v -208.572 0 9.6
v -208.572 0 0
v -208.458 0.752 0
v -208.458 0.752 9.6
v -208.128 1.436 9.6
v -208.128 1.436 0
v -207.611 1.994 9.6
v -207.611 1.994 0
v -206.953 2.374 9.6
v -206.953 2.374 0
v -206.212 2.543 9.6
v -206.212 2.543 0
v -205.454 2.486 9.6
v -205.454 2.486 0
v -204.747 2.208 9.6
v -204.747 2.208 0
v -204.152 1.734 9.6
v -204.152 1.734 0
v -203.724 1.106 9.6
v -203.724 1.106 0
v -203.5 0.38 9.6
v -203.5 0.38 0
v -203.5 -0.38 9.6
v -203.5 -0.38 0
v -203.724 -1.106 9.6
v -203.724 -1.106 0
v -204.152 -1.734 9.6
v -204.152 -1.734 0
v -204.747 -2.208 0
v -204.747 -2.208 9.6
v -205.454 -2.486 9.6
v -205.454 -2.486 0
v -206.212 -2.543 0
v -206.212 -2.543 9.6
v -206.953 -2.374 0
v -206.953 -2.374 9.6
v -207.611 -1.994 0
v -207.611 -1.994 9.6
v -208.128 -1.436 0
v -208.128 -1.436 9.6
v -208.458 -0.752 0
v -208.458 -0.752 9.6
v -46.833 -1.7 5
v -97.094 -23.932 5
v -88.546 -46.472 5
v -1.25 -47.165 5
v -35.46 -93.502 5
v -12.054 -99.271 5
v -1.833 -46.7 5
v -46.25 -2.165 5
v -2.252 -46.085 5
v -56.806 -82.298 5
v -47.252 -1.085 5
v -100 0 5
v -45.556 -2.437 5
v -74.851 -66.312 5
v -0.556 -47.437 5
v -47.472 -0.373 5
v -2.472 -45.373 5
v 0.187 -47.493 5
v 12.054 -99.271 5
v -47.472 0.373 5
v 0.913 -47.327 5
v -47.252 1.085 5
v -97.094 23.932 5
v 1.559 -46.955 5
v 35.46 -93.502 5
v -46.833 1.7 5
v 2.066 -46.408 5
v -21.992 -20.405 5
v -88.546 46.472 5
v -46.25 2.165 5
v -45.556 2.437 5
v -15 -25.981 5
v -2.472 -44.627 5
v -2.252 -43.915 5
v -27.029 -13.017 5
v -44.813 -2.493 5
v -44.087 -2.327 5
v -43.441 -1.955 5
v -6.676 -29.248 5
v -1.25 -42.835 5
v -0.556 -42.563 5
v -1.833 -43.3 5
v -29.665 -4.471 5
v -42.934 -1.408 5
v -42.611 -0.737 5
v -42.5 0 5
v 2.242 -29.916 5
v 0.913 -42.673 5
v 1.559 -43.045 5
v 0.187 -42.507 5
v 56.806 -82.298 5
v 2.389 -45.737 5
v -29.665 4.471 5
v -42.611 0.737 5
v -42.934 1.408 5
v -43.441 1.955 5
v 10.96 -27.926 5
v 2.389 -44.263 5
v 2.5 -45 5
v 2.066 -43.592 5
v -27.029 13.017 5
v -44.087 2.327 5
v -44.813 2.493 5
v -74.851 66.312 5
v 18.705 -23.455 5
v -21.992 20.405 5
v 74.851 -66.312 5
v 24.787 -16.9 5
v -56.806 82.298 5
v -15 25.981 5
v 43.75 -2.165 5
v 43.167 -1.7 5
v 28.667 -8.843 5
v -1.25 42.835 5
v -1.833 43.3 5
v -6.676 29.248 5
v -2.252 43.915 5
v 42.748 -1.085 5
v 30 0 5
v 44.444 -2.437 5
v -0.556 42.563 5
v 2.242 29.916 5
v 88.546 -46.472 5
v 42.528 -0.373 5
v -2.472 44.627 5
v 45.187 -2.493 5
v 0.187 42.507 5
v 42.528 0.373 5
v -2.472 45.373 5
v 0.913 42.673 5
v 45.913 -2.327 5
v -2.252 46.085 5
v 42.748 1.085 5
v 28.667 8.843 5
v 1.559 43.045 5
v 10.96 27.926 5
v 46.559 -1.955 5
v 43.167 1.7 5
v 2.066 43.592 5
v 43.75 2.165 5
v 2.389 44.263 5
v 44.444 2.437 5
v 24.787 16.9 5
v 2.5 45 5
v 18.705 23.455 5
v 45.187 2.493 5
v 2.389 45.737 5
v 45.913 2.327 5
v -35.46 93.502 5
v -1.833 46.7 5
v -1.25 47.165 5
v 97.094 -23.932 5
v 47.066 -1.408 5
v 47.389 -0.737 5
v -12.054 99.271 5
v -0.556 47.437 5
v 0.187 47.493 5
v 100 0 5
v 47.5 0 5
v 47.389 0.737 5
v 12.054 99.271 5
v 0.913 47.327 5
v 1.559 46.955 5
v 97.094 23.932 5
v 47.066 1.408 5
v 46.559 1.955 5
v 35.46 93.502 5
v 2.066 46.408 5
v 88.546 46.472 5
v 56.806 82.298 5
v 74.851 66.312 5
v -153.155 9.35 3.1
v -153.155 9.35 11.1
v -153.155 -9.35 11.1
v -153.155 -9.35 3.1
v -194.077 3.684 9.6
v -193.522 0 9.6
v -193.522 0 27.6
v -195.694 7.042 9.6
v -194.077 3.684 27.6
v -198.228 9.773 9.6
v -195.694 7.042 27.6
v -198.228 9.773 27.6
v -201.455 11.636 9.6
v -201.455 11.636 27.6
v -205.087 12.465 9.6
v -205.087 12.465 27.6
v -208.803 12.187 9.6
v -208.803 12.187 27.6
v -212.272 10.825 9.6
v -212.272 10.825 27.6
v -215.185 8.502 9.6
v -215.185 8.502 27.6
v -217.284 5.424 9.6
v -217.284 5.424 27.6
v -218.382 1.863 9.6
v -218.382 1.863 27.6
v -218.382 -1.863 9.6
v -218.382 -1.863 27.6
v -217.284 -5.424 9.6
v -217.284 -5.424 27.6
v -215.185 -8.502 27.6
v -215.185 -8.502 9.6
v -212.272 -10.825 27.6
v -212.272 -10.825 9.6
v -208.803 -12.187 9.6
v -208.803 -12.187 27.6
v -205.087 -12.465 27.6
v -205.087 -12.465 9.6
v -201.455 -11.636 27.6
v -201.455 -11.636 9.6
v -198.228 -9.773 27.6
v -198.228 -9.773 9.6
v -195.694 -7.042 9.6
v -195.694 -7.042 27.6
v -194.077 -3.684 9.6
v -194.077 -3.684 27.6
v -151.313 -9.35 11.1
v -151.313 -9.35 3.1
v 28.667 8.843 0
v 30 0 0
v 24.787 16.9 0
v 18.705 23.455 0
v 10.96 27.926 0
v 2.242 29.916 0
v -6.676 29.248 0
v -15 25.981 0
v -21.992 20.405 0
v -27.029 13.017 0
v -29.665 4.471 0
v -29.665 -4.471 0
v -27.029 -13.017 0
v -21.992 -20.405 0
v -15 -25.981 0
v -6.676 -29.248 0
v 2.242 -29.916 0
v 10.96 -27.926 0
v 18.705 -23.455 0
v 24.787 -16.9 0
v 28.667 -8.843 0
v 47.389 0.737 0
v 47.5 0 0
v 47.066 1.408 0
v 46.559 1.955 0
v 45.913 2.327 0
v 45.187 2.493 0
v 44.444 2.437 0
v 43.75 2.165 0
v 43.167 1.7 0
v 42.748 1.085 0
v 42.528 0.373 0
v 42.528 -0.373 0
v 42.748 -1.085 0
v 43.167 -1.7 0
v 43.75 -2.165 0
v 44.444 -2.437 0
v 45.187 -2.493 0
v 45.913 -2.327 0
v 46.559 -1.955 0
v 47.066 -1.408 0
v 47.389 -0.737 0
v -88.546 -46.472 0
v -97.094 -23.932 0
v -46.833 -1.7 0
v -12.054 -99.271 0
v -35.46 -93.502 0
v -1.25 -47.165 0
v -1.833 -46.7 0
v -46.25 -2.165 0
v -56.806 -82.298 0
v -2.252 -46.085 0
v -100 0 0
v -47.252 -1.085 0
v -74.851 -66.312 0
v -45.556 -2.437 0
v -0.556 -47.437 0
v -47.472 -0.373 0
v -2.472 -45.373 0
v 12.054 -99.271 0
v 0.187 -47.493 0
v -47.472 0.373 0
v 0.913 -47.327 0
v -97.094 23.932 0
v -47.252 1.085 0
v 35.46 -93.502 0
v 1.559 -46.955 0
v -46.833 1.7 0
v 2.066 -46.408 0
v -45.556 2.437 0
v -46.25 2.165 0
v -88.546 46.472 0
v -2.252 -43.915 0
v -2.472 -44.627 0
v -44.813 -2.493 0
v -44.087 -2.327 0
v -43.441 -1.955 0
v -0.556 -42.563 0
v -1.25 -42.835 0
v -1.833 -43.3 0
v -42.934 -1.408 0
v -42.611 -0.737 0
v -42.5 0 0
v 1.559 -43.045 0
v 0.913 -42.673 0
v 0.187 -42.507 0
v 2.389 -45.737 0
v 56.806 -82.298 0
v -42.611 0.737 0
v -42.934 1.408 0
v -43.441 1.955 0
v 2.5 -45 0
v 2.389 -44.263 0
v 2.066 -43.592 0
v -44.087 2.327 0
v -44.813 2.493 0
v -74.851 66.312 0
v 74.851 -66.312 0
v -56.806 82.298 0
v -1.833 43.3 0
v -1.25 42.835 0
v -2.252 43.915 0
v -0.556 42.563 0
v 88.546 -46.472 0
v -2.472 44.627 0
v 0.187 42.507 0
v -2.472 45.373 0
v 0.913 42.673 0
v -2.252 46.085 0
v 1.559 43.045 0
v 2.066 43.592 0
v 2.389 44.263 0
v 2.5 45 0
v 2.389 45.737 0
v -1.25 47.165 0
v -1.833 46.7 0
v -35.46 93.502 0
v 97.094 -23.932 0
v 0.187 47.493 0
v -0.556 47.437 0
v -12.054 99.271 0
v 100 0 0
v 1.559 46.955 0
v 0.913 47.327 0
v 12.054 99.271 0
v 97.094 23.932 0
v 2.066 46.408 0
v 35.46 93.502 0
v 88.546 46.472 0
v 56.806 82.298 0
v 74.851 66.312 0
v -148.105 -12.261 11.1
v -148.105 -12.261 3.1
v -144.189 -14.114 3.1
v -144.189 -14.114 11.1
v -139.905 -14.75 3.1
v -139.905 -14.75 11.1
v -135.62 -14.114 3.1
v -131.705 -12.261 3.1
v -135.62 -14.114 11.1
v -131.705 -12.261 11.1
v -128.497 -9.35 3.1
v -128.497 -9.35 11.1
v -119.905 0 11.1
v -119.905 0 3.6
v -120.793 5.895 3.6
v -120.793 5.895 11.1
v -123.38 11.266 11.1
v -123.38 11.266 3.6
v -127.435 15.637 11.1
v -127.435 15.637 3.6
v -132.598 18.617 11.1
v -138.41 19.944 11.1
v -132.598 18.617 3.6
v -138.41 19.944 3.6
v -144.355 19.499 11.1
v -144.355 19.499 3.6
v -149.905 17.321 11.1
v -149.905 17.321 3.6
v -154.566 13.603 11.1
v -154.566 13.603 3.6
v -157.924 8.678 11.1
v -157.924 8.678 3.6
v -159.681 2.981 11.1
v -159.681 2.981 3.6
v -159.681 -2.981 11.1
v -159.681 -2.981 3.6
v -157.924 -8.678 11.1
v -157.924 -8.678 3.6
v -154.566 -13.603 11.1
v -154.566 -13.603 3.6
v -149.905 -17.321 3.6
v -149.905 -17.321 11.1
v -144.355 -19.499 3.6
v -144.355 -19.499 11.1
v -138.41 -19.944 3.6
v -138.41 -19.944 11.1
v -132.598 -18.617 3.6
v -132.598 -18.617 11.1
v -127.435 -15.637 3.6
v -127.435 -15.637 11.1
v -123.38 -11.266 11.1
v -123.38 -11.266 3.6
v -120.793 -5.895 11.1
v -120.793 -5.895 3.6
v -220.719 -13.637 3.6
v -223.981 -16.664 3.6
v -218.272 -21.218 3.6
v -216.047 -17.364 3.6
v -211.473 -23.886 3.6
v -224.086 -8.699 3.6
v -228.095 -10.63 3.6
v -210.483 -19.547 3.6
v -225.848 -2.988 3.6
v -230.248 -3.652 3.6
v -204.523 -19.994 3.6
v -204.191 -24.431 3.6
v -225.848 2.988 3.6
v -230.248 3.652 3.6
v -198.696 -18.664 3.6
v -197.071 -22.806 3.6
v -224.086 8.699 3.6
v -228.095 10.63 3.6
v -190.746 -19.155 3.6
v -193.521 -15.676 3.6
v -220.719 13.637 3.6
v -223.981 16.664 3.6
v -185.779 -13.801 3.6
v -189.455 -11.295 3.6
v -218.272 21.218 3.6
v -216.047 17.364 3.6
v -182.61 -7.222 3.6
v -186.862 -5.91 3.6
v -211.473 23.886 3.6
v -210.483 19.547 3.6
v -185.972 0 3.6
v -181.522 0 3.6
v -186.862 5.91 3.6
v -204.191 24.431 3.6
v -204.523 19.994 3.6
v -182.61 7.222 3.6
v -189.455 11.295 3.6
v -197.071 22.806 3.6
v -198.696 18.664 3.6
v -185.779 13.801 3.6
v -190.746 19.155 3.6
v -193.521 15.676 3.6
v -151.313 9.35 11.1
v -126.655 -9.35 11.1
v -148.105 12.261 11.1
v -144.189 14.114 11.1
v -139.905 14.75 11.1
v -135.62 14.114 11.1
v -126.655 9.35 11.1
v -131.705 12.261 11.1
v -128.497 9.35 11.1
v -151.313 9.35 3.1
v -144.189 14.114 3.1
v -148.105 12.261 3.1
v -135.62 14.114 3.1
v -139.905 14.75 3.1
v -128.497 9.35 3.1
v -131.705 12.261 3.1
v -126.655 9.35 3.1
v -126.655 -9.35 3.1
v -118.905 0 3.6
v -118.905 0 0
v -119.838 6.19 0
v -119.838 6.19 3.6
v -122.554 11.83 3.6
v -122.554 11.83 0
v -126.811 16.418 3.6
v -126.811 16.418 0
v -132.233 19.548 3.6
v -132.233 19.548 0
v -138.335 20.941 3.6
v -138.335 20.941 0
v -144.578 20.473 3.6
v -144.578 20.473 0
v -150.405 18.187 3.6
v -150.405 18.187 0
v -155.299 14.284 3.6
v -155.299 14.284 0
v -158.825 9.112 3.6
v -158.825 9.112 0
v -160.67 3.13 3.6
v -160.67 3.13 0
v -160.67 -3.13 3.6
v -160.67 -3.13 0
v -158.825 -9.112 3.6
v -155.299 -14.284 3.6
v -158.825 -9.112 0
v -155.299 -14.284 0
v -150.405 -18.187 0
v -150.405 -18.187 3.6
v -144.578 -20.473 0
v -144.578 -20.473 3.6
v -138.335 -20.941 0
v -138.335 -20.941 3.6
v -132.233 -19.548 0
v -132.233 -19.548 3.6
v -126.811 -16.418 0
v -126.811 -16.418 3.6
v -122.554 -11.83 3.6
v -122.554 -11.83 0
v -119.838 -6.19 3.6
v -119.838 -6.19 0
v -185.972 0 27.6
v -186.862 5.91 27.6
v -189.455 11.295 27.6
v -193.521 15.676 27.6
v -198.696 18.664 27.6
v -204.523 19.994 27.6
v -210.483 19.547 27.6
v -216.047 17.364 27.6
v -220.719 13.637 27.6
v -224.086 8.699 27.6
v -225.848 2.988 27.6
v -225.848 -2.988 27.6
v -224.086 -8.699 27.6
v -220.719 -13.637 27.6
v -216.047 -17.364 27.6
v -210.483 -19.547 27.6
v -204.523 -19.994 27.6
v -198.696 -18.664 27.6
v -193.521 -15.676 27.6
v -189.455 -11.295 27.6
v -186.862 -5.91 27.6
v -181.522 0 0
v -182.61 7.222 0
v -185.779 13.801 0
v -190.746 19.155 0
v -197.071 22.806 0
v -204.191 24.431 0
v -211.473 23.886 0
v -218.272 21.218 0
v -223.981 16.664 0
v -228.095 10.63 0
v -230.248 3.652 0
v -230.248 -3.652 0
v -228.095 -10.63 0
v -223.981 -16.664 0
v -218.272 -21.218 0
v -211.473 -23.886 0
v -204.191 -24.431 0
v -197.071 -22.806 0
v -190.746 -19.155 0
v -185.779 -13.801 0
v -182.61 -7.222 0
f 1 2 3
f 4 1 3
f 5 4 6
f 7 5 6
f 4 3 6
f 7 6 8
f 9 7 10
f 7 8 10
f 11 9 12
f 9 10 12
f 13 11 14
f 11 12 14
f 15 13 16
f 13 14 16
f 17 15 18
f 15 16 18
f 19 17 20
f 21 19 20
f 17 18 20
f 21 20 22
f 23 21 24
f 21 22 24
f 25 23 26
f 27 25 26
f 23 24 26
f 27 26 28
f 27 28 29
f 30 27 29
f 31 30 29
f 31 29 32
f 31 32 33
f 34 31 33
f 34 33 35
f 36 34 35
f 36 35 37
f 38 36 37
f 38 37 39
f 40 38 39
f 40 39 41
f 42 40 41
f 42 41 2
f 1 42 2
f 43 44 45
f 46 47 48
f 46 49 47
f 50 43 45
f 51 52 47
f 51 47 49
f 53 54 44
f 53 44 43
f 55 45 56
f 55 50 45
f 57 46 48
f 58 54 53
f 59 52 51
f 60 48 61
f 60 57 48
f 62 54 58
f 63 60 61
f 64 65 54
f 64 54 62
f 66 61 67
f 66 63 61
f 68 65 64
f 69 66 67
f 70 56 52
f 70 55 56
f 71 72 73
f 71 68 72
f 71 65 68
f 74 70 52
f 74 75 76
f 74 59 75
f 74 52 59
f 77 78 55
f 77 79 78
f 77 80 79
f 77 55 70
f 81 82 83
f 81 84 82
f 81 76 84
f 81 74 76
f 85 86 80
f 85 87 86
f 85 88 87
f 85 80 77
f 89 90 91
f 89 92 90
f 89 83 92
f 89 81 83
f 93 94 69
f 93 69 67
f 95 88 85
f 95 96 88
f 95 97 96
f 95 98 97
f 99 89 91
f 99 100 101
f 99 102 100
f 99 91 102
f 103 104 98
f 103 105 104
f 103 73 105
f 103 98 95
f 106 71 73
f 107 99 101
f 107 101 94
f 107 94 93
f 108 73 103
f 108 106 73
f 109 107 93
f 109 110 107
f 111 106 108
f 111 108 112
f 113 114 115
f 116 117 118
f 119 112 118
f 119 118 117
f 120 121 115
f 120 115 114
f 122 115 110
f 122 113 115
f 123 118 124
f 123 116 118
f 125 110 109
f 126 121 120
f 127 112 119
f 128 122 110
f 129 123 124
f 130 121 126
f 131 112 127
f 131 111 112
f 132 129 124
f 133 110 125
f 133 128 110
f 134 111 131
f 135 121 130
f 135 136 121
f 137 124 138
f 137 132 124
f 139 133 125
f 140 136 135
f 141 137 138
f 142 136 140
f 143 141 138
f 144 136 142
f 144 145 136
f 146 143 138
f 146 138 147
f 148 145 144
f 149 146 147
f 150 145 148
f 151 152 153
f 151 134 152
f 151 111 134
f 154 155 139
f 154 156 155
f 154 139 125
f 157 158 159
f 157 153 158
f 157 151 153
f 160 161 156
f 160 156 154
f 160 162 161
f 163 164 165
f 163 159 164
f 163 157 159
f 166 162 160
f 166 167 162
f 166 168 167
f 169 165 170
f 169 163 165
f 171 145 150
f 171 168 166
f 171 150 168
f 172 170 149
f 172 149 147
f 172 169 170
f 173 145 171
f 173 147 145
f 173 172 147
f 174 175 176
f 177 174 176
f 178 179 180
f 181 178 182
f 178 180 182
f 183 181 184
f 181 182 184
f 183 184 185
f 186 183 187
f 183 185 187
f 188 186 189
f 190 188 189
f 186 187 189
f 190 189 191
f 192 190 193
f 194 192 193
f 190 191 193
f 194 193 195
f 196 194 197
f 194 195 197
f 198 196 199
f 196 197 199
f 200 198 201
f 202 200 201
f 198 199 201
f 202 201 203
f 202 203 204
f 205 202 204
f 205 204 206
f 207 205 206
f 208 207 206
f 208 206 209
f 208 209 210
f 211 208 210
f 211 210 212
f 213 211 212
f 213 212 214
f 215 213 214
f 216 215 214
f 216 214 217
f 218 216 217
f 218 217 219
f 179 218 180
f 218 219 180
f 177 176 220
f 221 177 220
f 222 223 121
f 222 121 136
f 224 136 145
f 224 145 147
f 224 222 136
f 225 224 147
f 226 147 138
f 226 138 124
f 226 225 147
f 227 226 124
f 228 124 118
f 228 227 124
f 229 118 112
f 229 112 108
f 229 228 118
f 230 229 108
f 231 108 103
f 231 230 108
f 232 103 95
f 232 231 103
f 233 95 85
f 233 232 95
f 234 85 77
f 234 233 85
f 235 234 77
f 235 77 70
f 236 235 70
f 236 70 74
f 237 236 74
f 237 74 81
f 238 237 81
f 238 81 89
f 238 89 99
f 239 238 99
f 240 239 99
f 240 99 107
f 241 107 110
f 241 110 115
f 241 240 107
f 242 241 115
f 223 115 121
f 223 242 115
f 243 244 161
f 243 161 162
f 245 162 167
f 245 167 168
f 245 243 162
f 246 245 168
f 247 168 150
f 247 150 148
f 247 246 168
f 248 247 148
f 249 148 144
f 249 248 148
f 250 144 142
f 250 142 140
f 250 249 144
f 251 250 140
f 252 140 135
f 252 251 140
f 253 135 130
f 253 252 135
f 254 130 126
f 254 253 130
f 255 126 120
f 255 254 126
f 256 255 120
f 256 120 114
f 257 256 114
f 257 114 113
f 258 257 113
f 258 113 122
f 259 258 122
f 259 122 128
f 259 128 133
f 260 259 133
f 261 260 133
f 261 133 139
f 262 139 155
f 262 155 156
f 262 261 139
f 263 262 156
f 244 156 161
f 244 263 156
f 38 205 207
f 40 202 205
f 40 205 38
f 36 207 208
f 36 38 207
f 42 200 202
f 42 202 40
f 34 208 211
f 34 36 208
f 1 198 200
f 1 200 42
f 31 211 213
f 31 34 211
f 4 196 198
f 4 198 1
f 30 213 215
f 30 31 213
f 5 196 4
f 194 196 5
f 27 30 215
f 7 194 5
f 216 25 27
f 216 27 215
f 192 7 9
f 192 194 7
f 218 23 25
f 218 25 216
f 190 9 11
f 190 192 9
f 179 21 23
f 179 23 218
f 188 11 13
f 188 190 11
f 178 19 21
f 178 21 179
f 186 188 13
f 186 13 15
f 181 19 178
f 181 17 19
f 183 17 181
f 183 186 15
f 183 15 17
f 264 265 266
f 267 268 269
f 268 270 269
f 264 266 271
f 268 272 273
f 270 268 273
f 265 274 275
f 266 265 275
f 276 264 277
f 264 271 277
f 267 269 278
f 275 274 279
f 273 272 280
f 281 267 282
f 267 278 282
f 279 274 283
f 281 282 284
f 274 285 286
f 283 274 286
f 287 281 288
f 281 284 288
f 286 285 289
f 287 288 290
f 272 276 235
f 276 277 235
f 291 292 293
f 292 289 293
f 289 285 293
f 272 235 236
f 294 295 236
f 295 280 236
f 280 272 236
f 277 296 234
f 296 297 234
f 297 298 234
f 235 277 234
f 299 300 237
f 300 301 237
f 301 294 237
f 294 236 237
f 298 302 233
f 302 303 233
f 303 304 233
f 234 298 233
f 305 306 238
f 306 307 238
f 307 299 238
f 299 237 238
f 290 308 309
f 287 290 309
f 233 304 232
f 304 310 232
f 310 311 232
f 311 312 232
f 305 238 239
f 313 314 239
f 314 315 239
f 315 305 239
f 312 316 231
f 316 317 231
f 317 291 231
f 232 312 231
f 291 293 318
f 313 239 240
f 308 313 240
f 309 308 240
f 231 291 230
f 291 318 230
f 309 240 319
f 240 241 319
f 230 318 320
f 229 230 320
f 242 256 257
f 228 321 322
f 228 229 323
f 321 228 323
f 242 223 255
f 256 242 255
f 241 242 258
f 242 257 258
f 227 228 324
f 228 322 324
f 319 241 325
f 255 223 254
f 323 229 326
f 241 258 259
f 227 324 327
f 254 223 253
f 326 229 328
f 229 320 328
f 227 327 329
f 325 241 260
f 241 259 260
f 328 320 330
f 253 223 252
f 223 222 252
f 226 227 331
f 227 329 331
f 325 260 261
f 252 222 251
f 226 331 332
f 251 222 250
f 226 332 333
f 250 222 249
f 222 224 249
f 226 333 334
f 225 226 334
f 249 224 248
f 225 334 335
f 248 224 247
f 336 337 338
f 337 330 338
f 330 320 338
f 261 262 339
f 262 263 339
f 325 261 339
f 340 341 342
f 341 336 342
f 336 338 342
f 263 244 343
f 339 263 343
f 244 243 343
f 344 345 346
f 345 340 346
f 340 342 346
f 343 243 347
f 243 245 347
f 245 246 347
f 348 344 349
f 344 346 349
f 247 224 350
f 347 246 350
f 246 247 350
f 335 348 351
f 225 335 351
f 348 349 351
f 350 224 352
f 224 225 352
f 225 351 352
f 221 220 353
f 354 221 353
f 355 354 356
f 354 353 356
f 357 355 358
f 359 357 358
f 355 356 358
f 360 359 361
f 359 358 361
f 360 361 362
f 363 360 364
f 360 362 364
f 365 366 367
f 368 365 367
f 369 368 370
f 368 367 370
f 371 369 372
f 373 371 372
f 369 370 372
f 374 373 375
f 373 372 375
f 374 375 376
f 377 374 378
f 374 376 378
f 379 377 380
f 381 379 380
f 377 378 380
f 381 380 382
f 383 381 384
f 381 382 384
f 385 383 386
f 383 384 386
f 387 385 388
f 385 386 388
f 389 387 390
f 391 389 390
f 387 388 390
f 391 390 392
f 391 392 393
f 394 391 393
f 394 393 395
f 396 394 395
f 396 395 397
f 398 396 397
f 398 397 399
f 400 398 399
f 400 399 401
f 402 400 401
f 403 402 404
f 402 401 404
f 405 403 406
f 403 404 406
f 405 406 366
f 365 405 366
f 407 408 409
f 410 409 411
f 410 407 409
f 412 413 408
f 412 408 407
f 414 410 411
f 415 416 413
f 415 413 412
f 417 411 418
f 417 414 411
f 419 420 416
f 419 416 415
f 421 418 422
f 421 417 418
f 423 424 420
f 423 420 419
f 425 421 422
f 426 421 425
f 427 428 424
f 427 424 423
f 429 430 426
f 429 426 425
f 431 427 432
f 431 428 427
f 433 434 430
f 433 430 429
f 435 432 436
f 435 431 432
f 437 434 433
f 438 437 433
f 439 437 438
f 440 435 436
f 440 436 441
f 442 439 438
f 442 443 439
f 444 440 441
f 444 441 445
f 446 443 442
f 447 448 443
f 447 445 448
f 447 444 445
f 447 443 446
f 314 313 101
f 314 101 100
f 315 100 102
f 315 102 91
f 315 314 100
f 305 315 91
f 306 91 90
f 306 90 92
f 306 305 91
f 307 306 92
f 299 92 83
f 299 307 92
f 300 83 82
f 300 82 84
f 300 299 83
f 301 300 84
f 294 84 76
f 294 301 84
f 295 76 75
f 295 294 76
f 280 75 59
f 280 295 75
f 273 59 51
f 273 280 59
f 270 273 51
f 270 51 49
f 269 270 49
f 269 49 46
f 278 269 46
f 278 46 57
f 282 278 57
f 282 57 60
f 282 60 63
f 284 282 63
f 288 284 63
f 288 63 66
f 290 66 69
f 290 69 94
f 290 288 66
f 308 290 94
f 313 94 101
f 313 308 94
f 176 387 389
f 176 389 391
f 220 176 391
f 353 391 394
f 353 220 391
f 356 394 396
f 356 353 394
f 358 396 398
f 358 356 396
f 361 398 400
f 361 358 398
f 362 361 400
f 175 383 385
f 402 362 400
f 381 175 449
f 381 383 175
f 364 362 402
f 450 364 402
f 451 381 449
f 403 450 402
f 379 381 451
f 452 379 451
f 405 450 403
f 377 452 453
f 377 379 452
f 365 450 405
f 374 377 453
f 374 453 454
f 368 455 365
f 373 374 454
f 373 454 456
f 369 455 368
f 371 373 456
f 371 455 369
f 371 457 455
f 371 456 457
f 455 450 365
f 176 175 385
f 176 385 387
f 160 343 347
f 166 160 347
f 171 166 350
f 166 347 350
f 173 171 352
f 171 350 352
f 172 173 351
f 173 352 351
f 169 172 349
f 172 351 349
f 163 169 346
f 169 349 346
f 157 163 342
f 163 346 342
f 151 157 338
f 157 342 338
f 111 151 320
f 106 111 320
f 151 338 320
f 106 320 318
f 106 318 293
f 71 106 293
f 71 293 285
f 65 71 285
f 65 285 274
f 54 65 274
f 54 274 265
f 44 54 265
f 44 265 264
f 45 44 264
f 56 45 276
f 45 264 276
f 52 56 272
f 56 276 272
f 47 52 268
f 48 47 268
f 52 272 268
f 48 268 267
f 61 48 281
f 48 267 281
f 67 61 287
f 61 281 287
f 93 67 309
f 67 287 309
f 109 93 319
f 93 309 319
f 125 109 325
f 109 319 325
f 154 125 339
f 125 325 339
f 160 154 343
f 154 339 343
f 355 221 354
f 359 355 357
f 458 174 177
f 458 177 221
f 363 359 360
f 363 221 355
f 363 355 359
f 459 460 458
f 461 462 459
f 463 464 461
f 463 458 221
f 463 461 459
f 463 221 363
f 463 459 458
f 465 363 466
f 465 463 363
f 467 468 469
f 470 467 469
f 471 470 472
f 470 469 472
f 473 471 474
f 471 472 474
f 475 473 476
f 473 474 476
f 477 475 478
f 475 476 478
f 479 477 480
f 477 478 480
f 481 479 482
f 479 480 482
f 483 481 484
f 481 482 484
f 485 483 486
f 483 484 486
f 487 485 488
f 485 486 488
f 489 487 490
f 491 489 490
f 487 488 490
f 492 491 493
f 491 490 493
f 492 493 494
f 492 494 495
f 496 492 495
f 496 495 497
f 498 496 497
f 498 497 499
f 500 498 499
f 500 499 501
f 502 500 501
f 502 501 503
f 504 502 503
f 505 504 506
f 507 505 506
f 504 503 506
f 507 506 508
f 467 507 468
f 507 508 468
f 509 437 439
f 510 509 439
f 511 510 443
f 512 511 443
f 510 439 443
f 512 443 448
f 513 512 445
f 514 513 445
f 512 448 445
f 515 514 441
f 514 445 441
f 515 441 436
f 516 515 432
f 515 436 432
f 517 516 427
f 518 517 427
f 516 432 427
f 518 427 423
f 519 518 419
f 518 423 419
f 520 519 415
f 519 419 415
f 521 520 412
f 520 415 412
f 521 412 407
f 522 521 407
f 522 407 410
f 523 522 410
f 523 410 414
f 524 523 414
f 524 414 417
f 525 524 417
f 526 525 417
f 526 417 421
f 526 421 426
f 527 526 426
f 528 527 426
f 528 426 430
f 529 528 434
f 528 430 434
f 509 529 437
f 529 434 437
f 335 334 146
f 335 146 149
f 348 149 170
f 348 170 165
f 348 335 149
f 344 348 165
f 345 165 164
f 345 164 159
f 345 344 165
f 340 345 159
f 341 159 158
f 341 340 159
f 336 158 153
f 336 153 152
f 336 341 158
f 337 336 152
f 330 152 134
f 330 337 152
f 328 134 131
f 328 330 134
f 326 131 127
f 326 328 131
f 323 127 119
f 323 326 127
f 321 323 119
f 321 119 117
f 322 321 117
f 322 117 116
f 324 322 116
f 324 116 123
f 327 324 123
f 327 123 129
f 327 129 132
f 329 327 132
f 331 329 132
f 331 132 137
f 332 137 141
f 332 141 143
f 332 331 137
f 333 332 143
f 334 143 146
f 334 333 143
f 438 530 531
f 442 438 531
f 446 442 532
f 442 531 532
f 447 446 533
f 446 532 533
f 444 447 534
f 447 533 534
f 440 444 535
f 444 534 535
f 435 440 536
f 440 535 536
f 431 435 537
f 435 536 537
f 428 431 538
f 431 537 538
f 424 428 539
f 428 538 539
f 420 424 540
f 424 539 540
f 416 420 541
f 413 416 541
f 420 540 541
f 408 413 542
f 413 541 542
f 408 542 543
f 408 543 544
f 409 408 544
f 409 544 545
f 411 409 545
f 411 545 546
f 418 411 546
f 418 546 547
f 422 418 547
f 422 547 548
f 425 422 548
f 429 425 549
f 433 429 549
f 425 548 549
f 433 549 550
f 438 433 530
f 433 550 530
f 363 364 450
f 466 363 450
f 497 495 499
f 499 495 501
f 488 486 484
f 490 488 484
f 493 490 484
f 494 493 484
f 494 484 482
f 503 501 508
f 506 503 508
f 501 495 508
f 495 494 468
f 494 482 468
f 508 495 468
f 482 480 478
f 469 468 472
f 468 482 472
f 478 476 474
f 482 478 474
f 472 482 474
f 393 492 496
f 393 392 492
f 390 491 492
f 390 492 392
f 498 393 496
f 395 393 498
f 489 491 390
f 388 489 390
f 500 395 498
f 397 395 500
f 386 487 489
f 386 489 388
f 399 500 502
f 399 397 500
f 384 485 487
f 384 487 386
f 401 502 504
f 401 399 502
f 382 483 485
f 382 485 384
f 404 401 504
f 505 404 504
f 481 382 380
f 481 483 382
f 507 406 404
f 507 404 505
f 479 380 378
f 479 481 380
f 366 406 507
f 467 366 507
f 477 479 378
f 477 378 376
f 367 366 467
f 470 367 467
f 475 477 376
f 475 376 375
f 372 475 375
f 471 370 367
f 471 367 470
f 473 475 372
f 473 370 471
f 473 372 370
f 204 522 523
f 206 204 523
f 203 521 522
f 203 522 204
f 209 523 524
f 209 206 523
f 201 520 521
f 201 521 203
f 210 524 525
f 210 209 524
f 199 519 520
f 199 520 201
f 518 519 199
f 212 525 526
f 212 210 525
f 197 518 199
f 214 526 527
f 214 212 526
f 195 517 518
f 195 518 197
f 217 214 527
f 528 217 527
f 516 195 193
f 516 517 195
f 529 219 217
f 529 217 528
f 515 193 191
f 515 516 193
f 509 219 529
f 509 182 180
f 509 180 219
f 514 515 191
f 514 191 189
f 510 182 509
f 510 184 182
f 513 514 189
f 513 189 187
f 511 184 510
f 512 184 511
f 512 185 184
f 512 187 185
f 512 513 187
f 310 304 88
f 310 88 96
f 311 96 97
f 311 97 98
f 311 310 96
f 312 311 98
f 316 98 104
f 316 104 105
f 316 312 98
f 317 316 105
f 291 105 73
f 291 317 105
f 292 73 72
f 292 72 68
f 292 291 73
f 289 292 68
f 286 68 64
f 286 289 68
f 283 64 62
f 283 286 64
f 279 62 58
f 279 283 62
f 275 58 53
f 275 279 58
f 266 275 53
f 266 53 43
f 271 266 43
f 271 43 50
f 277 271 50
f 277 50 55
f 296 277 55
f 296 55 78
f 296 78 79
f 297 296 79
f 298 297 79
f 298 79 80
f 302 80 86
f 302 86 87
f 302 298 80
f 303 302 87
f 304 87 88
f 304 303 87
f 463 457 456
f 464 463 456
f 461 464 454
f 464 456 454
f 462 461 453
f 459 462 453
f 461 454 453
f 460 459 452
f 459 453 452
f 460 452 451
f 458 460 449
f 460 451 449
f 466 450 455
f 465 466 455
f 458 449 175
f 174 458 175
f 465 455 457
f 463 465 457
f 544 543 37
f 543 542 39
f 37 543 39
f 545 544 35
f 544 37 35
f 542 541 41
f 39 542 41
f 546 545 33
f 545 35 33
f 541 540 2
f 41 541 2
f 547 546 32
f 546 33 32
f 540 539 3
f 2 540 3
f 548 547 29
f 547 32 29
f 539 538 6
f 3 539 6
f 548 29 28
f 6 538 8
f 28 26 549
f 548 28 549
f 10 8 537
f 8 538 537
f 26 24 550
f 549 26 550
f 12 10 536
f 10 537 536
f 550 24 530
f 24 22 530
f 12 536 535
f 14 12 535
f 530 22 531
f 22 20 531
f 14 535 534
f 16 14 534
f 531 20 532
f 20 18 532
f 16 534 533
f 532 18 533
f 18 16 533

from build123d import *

# Parameters (mm, degrees)
F0_R      = 100
F0_R_2    = 2.5
F0_R_3    = 30
F1_DEPTH  = 5
F2_R      = 24.5
F3_DEPTH  = 3.6
F4_R      = 20.05
F5_DEPTH  = 24
F6_R      = 12.5
F7_DEPTH  = 18
F9_D      = 5.1
F10_R     = 21
F11_DEPTH = 3.6
F12_R     = 20
F13_DEPTH = 7.5
F15_DEPTH = 8


with BuildPart() as f1:
    # F0 (on Top) → F1 (new body)
    with BuildSketch(Plane.XY):
        Circle(F0_R)
        with Locations((0, -45)):
            Circle(F0_R_2, mode=Mode.SUBTRACT)
        with Locations((-45, 0)):
            Circle(F0_R_2, mode=Mode.SUBTRACT)
        Circle(F0_R_3, mode=Mode.SUBTRACT)
        with Locations((45, 0)):
            Circle(F0_R_2, mode=Mode.SUBTRACT)
        with Locations((0, 45)):
            Circle(F0_R_2, mode=Mode.SUBTRACT)
    extrude(amount=F1_DEPTH)


with BuildPart() as f3:
    # F2 (on Top) → F3 (new body)
    with BuildSketch(Plane.XY):
        with Locations((-206.021562, 0)):
            Circle(F2_R)
    extrude(amount=F3_DEPTH)

    # F4 (on face) → F5 (join)
    with BuildSketch(Plane.XY.offset(3.6)):
        with Locations((-206.021562, 0)):
            Circle(F4_R)
    extrude(amount=F5_DEPTH)

    # F6 (on face) → F7 (cut)
    with BuildSketch(Plane.XY.offset(27.6)):
        with Locations((-206.021562, 0)):
            Circle(F6_R)
    extrude(amount=-F7_DEPTH, mode=Mode.SUBTRACT)

    # F9 (through all)
    with Locations(Plane.XY.offset(9.6)):
        with Locations((-206.021562, 0)):
            Hole(F9_D / 2)


with BuildPart() as f11:
    # F10 (on Top) → F11 (new body)
    with BuildSketch(Plane.XY):
        with Locations((-139.904723, 0)):
            Circle(F10_R)
    extrude(amount=F11_DEPTH)

    # F12 (on face) → F13 (join)
    with BuildSketch(Plane.XY.offset(3.6)):
        with Locations((-139.904723, 0)):
            Circle(F12_R)
    extrude(amount=F13_DEPTH)

    # F14 (on face) → F15 (cut)
    with BuildSketch(Plane.XY.offset(11.1)):
        with BuildLine():
            Line((-126.654723, 9.35), (-128.496831, 9.35))
            ThreePointArc((-128.496831, 9.35), (-139.904723, 14.75), (-151.312615, 9.35))
            Line((-151.312615, 9.35), (-153.154723, 9.35))
            Line((-153.154723, 9.35), (-153.154723, 6.480741))
            Line((-153.154723, 6.480741), (-153.154723, -6.480741))
            Line((-153.154723, -6.480741), (-153.154723, -9.35))
            Line((-153.154723, -9.35), (-151.312615, -9.35))
            ThreePointArc((-151.312615, -9.35), (-139.904723, -14.75), (-128.496831, -9.35))
            Line((-128.496831, -9.35), (-126.654723, -9.35))
            Line((-126.654723, -9.35), (-126.654723, -6.480741))
            Line((-126.654723, -6.480741), (-126.654723, 6.480741))
            Line((-126.654723, 6.480741), (-126.654723, 9.35))
        make_face()
    extrude(amount=-F15_DEPTH, mode=Mode.SUBTRACT)


with BuildPart() as f16_1:
    # F16: copy of F11
    add(f11.part)


solid = Compound([f1.part, f3.part, f11.part])
